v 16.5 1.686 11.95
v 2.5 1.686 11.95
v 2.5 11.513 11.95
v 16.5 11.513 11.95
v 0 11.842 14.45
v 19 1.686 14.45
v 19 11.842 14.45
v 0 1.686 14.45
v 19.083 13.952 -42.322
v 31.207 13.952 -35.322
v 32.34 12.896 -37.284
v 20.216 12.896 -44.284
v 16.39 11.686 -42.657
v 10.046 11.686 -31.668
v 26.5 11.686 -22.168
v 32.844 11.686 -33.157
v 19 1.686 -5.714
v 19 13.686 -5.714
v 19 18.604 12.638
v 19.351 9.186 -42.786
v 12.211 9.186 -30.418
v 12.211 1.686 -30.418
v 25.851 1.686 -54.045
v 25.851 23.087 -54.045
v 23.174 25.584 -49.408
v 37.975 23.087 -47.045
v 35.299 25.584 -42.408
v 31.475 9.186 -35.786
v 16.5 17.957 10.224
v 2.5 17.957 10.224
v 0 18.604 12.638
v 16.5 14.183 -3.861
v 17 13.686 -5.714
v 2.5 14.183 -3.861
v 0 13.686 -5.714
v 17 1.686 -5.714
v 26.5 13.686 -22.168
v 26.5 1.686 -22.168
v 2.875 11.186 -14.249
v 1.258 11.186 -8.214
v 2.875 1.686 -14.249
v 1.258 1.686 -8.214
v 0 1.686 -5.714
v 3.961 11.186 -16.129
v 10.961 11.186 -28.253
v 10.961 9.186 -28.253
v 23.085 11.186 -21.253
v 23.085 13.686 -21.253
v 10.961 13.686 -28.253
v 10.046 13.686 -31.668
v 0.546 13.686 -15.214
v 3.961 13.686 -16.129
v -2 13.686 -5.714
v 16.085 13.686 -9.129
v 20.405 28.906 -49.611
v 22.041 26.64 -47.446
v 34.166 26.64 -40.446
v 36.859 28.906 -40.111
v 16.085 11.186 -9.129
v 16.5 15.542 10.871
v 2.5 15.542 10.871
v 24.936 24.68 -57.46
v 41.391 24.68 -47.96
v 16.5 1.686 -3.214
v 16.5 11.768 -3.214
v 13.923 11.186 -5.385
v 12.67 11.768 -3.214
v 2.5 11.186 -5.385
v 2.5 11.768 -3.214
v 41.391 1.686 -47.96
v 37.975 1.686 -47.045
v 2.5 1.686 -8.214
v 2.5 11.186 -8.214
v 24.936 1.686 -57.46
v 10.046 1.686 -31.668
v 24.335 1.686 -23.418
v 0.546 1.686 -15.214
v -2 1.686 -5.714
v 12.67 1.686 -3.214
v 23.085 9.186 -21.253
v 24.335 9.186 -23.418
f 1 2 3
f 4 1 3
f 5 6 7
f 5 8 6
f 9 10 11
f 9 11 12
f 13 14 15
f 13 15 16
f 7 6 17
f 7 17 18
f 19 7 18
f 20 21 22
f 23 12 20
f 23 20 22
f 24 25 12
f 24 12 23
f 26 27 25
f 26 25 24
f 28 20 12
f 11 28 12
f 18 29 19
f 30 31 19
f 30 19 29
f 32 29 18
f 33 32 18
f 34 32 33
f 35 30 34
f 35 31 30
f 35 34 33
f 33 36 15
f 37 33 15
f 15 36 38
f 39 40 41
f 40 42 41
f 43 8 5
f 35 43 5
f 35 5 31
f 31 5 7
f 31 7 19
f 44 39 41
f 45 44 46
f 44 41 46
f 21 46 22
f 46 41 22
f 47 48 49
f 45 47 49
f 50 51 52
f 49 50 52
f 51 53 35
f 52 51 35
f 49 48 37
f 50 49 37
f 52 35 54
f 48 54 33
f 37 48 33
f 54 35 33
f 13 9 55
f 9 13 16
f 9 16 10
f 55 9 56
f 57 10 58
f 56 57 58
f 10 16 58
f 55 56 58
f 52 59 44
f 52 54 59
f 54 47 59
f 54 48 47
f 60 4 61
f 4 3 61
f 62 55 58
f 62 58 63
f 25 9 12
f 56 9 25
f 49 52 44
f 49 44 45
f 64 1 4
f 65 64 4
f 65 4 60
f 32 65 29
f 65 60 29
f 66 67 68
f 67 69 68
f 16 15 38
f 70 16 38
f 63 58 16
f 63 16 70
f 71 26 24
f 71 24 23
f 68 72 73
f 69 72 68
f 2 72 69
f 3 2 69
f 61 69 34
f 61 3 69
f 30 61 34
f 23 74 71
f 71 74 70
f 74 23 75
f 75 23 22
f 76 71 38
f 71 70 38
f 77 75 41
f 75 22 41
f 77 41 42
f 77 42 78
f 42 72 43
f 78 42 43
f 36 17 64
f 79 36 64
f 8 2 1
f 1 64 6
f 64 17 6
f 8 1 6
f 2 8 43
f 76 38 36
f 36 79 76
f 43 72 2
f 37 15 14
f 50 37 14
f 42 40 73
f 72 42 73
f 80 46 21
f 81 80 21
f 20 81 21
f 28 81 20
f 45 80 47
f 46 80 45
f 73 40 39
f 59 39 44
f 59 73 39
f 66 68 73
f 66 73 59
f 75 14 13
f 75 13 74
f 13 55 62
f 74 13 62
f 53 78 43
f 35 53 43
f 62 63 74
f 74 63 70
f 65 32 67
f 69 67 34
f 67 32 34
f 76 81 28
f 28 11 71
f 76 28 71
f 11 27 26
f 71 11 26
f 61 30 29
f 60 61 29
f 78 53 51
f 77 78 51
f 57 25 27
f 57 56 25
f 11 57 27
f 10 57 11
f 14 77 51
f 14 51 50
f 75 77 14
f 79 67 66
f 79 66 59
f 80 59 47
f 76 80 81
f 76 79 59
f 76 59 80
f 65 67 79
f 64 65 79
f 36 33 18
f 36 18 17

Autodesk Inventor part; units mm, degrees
ref_plane "YZ Plane" through (0, 0, 0) normal (1, 0, 0) x (0, 1, 0)
ref_plane "XZ Plane" through (0, 0, 0) normal (0, 1, 0) x (-1, 0, 0)
ref_plane "XY Plane" through (0, 0, 0) normal (0, 0, 1) x (1, 0, 0)
sketch "Sketch1" plane through (0, 0, 0) normal (1, 0, 0) x (0, 1, 0)
  line L0 (1.6864, 14.4503) -> (11.8425, 14.4503)
  line L1 (11.8425, 14.4503) -> (18.604, 12.6385)
  line L2 (18.604, 12.6385) -> (13.6864, -5.714)
  line L3 (13.6864, -5.714) -> (1.6864, -5.714)
  line L4 (1.6864, -5.714) -> (1.6864, 14.4503)
  point P0 (0, 0)
  dimension "d0" = 19
  dimension "d1" = 7
  dimension "d2" = 105
  dimension "d3" = 12
extrude "Extrusion1" add sketch "Sketch1" along normal blind 19
sketch "Sketch2" plane through (0, 1.6864, -5.714) normal (0, -1, 0) x (1, 0, 0)
  line L0 (0, 0) -> (19, 0) projected
  line L1 (26.5, -16.4545) -> (10.0455, -25.9545)
  line L2 (0, 0) -> (0, 20.1643) construction
  line L3 (0.5455, -9.5) -> (10.0455, -25.9545)
  line L4 (-2, 0) -> (17, 0)
  line L5 (-2, 0) -> (0.5455, -9.5)
  line L6 (17, 0) -> (26.5, -16.4545)
  line L7 (17, 0) -> (0.5455, -9.5) construction
  point P0 (0, 5.714)
  dimension "d6" = 19
  dimension "d10" = 19
  dimension "d23" = 19
  dimension "d25" = 30
  dimension "d26" = 19
  dimension "d27" = 2
extrude "Extrusion2" add sketch "Sketch2" against normal blind 12
sketch "Sketch3" plane through (26.5, 1.6864, -22.1685) normal (0.8660254, 0, 0.5) x (0.5, 0, -0.8660254)
  line L0 (0, 0) -> (0, 10)
  line L1 (0, 10) -> (0, 15.9167) construction
  line L2 (0, 15.9167) -> (12.6883, 10) construction
  line L3 (12.6883, 10) -> (20.7181, 27.2198)
  line L4 (20.7181, 27.2198) -> (29.7811, 22.9937)
  line L5 (29.7811, 22.9937) -> (29.7811, 0)
  line L6 (29.7811, 0) -> (0, 0)
  line L7 (0, 10) -> (12.6883, 10)
  line L8 (0, 0) -> (0, 12) projected
  dimension "d16" = 19
  dimension "d17" = 10
  dimension "d18" = 14
  dimension "d20" = 25
  dimension "d30" = 10
extrude "Extrusion4" add sketch "Sketch3" against normal blind 19
shell "Shell1" thickness 2.5 removed faces 1 at (27.7756, 1.6864, -37.0445)
sketch "Sketch4" plane through (0, 18.604, 12.6385) normal (0, 0.9659258, -0.258819) x (1, 0, 0)
  line L0 (2.5, 2.5) -> (16.5, 2.5) projected
  line L1 (16.5, 17.0817) -> (16.5, 2.5) projected
  line L2 (2.5, 2.5) -> (16.5, 2.5)
  line L3 (16.5, 2.5) -> (16.5, 17.0817)
  line L4 (16.5, 17.0817) -> (2.5, 17.0817)
  line L5 (2.5, 17.0817) -> (2.5, 2.5)
  point P0 (0, 17.023)
sketch "Sketch5" plane through (0, 13.6864, -5.714) normal (0, 1, 0) x (1, 0, 0)
  line L0 (23.0849, 15.5394) -> (10.9606, 22.5394) projected
  line L1 (10.9606, 22.5394) -> (23.0849, 15.5394)
  line L2 (23.0849, 15.5394) -> (16.0849, 3.4151)
  line L3 (16.0849, 3.4151) -> (3.9606, 10.4151)
  line L4 (3.9606, 10.4151) -> (10.9606, 22.5394)
  point P0 (0, -5.714)
  dimension "d32" = 14
sketch "Sketch6" plane through (32.8442, 11.6864, -33.1569) normal (-0.4531539, 0.4226183, 0.7848856) x (0.8660254, 0, 0.5)
  line L0 (-16.5, 16.5) -> (-2.5, 16.5)
  line L1 (-2.5, 16.5) -> (-2.5, 2.5)
  line L2 (-2.5, 2.5) -> (-16.5, 2.5)
  line L3 (-16.5, 2.5) -> (-16.5, 16.5)
  line L4 (0, 19) -> (-19, 19) projected
  line L5 (-19, 0) -> (-19, 19) projected
  point P0 (-11.8654, -29.6671)
  dimension "d33" = 14
  dimension "d34" = 14
  dimension "d35" = 2.5
  dimension "d36" = 2.5
extrude "Extrusion5" cut sketch "Sketch4" against normal up to next
extrude "Extrusion6" cut sketch "Sketch5" against normal up to next
extrude "Extrusion7" cut sketch "Sketch6" against normal up to next
properties part number "k2_thumb"
